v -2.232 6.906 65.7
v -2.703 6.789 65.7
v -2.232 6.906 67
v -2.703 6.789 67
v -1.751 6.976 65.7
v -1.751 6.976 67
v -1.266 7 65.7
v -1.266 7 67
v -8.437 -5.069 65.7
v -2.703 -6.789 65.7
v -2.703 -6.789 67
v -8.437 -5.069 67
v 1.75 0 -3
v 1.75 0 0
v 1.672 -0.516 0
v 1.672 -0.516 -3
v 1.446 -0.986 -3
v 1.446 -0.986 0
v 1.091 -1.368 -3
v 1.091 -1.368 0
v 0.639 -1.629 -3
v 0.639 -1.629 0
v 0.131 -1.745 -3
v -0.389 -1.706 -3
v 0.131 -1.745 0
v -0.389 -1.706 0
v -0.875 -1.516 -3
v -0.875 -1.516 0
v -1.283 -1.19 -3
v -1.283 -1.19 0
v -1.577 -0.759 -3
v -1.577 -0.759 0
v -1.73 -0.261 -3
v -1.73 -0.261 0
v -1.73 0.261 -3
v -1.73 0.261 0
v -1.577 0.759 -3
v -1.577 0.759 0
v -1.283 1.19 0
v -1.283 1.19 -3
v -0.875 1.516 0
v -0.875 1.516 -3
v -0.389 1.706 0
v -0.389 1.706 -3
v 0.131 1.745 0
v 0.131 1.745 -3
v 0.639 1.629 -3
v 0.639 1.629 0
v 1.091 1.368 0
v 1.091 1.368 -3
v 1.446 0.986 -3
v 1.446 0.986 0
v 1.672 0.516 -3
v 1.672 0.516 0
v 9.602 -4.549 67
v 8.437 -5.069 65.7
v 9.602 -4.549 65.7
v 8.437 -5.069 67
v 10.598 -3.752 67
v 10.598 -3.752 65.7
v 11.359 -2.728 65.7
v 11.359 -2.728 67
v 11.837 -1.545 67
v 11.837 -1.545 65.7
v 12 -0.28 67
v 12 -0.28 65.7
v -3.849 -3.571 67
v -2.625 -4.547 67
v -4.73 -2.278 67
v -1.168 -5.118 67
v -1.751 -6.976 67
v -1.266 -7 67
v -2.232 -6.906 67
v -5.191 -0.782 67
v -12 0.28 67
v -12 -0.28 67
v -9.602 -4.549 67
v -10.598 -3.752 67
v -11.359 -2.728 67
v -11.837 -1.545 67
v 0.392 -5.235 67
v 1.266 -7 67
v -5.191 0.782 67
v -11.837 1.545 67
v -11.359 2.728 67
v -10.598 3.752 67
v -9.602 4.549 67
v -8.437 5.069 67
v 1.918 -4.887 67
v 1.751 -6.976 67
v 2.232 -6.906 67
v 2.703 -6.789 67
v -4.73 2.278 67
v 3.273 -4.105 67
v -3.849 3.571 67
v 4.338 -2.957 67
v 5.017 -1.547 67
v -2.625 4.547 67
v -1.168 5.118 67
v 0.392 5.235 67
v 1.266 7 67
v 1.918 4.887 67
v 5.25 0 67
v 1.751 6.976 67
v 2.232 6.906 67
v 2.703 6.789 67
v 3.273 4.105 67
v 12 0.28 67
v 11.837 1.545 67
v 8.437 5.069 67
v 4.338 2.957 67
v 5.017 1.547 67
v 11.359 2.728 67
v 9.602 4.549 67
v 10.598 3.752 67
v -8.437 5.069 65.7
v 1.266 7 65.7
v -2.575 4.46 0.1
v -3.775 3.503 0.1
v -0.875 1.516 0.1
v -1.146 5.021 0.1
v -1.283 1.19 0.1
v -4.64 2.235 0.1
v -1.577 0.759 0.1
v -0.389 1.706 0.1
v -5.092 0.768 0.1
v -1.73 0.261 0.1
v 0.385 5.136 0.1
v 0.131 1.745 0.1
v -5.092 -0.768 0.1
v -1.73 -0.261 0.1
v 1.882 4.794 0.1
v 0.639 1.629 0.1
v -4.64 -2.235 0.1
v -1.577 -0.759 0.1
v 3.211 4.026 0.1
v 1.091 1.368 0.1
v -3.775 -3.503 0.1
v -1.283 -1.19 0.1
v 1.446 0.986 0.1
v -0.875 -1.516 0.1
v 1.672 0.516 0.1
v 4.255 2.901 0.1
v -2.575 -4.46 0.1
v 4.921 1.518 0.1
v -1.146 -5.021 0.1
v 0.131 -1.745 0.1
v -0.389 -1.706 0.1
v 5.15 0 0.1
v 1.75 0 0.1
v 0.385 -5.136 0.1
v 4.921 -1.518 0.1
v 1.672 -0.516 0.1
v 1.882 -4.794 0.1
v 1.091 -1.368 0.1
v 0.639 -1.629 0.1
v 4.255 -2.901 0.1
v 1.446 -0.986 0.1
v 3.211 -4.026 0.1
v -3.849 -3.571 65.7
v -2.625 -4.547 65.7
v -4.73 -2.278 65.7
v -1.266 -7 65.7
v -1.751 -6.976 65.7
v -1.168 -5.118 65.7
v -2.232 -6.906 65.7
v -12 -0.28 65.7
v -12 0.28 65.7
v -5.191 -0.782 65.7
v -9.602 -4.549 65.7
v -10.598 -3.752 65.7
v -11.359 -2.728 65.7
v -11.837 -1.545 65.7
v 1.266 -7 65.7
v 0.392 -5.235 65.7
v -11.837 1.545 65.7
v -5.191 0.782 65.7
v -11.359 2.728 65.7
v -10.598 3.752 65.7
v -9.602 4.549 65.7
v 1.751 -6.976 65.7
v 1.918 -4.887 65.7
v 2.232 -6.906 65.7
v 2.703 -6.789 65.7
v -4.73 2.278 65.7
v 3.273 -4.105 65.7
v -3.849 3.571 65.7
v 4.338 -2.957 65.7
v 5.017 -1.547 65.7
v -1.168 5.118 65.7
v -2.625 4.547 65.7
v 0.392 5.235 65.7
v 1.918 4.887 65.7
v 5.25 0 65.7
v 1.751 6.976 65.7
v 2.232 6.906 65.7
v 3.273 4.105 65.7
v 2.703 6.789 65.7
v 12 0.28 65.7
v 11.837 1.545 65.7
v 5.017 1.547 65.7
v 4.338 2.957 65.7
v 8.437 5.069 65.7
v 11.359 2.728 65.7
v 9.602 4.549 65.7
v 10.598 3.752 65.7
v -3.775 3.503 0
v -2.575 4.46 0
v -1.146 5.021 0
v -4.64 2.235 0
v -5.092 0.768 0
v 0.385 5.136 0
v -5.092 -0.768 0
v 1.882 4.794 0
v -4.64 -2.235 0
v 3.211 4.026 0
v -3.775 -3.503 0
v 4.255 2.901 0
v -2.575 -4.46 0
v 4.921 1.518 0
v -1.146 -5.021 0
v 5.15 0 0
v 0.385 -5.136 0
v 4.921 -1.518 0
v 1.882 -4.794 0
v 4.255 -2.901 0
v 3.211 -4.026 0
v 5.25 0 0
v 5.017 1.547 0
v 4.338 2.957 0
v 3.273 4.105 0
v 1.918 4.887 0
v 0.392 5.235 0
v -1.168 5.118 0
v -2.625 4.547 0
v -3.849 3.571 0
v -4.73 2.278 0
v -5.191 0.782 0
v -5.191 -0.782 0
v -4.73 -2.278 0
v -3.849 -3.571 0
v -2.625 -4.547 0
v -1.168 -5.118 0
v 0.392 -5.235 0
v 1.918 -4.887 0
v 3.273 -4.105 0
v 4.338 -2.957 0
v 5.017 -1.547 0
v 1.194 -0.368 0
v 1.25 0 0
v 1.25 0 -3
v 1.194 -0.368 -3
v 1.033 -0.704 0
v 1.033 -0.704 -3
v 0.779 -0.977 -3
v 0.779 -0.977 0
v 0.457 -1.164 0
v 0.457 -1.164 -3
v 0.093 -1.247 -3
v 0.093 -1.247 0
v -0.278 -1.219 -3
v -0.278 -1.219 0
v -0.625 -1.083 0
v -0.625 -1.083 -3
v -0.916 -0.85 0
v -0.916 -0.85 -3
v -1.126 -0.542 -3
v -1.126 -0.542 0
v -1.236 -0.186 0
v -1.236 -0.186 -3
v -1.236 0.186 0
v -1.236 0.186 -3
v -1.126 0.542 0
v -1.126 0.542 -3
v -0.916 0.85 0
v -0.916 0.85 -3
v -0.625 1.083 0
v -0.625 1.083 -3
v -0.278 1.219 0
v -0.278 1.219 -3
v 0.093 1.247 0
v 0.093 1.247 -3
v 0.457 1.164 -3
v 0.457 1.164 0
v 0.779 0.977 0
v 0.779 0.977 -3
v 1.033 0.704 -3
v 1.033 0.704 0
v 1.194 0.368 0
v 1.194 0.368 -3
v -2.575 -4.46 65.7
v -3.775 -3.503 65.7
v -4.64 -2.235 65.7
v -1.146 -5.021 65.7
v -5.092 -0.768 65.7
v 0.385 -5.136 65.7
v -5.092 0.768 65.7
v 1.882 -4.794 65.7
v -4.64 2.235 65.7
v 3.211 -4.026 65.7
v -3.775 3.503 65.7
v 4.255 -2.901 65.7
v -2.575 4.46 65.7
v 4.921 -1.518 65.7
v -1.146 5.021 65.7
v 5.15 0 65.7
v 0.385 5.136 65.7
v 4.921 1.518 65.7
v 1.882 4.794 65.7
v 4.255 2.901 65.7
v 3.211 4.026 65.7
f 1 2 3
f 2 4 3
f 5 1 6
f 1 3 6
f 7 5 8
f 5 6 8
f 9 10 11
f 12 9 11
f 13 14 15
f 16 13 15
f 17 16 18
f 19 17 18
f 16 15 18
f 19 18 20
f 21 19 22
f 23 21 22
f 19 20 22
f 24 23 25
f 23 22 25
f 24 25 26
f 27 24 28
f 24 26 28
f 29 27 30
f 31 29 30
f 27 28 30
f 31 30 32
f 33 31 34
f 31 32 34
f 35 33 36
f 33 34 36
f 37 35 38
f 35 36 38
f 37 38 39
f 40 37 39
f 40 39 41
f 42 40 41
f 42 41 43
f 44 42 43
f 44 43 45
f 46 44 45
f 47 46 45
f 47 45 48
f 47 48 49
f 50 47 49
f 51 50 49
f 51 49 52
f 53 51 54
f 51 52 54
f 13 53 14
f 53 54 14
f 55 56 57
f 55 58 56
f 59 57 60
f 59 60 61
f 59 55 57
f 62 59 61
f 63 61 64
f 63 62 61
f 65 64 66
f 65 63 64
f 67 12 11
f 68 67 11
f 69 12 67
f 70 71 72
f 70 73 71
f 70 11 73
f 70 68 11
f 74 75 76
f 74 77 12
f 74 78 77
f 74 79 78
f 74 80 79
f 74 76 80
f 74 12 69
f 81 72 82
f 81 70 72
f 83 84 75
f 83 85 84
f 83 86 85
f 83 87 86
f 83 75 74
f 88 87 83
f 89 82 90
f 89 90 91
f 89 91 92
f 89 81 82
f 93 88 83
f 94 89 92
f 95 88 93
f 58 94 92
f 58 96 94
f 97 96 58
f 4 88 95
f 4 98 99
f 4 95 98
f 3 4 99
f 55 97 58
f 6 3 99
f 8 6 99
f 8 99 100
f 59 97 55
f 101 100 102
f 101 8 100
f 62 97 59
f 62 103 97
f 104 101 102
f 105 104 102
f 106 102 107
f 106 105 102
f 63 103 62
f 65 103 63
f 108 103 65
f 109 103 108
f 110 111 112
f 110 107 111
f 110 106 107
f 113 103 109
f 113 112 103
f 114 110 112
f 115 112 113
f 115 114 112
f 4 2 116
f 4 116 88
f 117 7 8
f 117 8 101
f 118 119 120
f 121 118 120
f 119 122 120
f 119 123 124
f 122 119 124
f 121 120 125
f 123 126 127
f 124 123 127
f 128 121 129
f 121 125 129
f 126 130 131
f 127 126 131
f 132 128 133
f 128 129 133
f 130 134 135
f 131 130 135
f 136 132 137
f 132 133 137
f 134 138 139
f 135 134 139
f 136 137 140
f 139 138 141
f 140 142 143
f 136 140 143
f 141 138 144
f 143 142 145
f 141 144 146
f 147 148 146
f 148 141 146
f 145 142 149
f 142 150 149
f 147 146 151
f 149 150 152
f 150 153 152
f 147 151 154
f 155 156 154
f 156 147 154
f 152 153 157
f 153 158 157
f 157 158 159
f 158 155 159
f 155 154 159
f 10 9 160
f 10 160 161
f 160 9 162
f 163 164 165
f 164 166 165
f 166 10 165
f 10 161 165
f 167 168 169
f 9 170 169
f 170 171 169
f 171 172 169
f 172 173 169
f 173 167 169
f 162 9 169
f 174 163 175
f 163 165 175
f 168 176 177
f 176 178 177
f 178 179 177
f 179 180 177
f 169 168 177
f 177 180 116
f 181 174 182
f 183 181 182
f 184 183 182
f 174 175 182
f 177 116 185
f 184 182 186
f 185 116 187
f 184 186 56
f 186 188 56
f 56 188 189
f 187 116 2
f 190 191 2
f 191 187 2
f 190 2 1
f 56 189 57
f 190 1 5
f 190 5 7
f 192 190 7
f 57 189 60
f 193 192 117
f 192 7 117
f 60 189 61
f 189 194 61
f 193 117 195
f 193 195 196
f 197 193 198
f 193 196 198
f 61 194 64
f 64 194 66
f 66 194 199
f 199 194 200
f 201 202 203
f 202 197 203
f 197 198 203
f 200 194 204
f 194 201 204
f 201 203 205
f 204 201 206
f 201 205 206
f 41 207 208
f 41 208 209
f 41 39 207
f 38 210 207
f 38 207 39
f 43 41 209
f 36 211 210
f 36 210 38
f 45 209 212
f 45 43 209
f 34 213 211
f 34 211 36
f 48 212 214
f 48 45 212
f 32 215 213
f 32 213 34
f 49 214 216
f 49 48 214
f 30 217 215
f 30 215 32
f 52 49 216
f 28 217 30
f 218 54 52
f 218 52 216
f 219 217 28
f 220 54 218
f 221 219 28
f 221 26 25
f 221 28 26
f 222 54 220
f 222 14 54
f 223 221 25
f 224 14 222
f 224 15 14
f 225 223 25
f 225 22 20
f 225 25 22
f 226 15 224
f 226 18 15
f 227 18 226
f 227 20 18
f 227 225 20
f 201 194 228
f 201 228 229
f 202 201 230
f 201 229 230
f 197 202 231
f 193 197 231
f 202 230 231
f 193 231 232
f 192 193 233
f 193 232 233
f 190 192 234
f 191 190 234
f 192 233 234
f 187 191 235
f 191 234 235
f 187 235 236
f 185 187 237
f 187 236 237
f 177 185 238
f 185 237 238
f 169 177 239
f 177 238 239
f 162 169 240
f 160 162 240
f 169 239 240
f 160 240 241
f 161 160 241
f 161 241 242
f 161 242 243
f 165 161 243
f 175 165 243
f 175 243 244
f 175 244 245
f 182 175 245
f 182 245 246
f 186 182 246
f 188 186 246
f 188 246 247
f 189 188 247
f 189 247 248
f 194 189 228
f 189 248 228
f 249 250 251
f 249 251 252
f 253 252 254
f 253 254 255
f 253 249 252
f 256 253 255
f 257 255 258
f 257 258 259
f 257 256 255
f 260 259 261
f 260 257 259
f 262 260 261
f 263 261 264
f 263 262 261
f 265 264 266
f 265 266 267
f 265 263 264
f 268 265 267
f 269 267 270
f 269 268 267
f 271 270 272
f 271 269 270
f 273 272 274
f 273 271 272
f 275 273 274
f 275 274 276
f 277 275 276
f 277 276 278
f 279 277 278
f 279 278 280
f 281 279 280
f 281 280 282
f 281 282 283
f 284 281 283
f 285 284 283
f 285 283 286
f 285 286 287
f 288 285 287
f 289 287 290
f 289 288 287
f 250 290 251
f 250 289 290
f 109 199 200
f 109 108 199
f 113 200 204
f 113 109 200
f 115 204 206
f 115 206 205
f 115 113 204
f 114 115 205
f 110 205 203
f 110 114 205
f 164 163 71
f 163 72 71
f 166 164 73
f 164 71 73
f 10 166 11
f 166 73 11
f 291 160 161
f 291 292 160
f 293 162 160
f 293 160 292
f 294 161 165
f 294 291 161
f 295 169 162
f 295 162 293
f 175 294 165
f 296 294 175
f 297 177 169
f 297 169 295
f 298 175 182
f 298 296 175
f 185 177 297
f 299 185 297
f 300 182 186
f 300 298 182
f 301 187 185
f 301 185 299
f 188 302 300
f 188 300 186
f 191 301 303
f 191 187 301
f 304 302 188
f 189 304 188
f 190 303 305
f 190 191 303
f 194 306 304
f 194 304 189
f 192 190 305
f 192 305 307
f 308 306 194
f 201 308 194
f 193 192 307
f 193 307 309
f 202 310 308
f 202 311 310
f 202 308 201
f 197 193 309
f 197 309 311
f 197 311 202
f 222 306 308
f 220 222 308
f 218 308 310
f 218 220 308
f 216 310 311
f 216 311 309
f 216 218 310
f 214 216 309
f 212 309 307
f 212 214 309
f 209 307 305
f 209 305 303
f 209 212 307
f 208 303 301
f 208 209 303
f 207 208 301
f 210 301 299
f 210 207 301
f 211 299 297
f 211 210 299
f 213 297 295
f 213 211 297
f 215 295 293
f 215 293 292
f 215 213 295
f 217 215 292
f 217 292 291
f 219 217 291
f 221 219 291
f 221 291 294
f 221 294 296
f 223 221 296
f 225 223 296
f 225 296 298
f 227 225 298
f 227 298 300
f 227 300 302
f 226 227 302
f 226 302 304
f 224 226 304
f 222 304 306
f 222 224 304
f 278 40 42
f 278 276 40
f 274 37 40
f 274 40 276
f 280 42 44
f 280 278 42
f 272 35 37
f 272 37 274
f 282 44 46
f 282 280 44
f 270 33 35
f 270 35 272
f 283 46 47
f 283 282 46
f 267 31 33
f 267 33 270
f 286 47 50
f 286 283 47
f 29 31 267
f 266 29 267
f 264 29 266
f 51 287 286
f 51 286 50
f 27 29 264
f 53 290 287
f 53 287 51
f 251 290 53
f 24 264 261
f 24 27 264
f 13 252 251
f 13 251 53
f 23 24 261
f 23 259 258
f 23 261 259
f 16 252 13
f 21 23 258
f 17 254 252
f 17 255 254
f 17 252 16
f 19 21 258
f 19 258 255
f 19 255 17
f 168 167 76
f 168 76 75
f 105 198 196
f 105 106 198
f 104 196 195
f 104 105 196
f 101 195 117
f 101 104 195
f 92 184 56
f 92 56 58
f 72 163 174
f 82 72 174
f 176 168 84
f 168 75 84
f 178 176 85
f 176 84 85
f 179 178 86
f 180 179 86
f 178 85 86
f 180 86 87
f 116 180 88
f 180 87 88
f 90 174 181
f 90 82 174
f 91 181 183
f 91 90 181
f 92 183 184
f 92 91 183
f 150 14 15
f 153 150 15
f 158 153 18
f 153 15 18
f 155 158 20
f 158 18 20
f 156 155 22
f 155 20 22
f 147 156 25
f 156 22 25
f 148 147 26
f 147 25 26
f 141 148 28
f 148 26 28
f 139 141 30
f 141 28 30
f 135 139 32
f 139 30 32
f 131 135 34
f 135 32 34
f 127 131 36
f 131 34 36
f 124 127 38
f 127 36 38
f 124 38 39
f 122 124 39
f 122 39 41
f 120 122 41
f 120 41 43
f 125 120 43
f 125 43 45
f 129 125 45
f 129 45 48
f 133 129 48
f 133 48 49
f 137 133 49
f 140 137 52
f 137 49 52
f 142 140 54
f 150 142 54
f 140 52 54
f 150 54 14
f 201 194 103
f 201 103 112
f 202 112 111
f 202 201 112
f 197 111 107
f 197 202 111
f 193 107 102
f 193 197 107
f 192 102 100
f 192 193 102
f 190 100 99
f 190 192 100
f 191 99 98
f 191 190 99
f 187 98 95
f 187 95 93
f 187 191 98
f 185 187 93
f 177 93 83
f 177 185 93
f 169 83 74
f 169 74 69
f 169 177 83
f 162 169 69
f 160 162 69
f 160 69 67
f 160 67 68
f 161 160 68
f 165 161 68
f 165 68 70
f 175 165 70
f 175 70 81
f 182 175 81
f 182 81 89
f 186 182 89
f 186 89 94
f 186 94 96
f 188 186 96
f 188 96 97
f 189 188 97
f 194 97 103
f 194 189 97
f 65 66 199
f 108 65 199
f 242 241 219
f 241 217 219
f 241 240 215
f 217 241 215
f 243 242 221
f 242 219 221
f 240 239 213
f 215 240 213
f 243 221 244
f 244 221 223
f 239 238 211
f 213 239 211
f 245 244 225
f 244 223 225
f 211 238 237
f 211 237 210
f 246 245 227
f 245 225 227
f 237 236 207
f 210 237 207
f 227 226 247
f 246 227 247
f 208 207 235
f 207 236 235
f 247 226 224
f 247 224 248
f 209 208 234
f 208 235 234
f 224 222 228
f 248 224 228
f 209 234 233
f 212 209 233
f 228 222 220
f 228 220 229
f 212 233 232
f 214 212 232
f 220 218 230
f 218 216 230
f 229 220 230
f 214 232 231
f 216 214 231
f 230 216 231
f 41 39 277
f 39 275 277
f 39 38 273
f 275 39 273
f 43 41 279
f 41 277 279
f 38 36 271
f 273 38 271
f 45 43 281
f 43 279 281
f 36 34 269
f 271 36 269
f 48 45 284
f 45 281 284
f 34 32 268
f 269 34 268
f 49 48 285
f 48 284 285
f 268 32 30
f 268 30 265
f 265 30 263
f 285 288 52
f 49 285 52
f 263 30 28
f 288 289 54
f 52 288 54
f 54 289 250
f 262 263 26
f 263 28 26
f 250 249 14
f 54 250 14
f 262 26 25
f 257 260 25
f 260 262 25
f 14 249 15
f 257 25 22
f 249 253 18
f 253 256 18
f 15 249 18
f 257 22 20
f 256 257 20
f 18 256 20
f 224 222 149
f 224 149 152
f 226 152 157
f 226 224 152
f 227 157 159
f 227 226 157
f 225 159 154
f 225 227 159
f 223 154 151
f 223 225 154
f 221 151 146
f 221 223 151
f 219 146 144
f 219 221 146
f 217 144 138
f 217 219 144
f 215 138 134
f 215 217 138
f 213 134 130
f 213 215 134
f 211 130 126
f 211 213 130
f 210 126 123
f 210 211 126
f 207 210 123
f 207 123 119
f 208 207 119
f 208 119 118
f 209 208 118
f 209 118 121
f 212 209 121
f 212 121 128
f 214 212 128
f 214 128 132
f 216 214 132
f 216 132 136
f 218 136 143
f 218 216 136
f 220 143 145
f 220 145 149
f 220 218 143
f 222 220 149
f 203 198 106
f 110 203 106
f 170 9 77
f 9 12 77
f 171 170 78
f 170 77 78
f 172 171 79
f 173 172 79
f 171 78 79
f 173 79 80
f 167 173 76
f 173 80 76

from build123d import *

# Parameters (mm, degrees)
F0_R       = 5.25
F0_R_2     = 5.15
F1_DEPTH   = 65.7
F2_W       = 24
F2_H       = 14
F2_R       = 5.25
F3_DEPTH   = 1.3
F4_SIZE2   = 10
F4_SIZE    = 3
F4_2_SIZE2 = 10
F4_2_SIZE  = 3
F5_R       = 5
F6_R       = 5.15
F6_R_2     = 1.75
F7_DEPTH   = 0.1
F8_R       = 1.75
F8_R_2     = 1.25
F9_DEPTH   = 3


with BuildPart() as f1:
    # F0 (on Top) → F1 (new body)
    with BuildSketch(Plane.XY):
        Circle(F0_R)
        Circle(F0_R_2, mode=Mode.SUBTRACT)
    extrude(amount=F1_DEPTH)


with BuildPart() as f3:
    # F2 (on face) → F3 (new body)
    with BuildSketch(Plane.XY.offset(65.7)):
        Rectangle(F2_W, F2_H)
        Circle(F2_R, mode=Mode.SUBTRACT)
    extrude(amount=F3_DEPTH)

    # F4
    f4_edges = [f3.edges().sort_by_distance(p)[0] for p in [
        (-12, 7, 66.35),
        (-12, -7, 66.35),
    ]]
    f4_side = f3.faces().sort_by_distance((-12, 0, 66.35))[0]
    chamfer(f4_edges, length=F4_SIZE, length2=F4_SIZE2, reference=f4_side)

    # F4#2
    f4_2_edges = [f3.edges().sort_by_distance(p)[0] for p in [
        (12, 7, 66.35),
        (12, -7, 66.35),
    ]]
    f4_2_side = f3.faces().sort_by_distance((12, 0, 66.35))[0]
    chamfer(f4_2_edges, length=F4_2_SIZE, length2=F4_2_SIZE2, reference=f4_2_side)

    # F5
    f5_edges = [f3.edges().sort_by_distance(p)[0] for p in [
        (-12, -4, 66.35),
        (-2, -7, 66.35),
        (2, -7, 66.35),
        (12, -4, 66.35),
        (12, 4, 66.35),
        (2, 7, 66.35),
        (-2, 7, 66.35),
        (-12, 4, 66.35),
    ]]
    fillet(f5_edges, radius=F5_R)


with BuildPart() as f7:
    # F6 (on face) → F7 (new body)
    with BuildSketch(Plane(origin=(0, 0, 0), x_dir=(1, 0, 0), z_dir=(0, 0, -1))):
        Circle(F6_R)
        Circle(F6_R_2, mode=Mode.SUBTRACT)
    extrude(amount=-F7_DEPTH)


with BuildPart() as f9:
    # F8 (on face) → F9 (new body)
    with BuildSketch(Plane(origin=(0, 0, 0), x_dir=(1, 0, 0), z_dir=(0, 0, -1))):
        Circle(F8_R)
        Circle(F8_R_2, mode=Mode.SUBTRACT)
    extrude(amount=F9_DEPTH)


solid = Compound([f1.part, f3.part, f7.part, f9.part])
